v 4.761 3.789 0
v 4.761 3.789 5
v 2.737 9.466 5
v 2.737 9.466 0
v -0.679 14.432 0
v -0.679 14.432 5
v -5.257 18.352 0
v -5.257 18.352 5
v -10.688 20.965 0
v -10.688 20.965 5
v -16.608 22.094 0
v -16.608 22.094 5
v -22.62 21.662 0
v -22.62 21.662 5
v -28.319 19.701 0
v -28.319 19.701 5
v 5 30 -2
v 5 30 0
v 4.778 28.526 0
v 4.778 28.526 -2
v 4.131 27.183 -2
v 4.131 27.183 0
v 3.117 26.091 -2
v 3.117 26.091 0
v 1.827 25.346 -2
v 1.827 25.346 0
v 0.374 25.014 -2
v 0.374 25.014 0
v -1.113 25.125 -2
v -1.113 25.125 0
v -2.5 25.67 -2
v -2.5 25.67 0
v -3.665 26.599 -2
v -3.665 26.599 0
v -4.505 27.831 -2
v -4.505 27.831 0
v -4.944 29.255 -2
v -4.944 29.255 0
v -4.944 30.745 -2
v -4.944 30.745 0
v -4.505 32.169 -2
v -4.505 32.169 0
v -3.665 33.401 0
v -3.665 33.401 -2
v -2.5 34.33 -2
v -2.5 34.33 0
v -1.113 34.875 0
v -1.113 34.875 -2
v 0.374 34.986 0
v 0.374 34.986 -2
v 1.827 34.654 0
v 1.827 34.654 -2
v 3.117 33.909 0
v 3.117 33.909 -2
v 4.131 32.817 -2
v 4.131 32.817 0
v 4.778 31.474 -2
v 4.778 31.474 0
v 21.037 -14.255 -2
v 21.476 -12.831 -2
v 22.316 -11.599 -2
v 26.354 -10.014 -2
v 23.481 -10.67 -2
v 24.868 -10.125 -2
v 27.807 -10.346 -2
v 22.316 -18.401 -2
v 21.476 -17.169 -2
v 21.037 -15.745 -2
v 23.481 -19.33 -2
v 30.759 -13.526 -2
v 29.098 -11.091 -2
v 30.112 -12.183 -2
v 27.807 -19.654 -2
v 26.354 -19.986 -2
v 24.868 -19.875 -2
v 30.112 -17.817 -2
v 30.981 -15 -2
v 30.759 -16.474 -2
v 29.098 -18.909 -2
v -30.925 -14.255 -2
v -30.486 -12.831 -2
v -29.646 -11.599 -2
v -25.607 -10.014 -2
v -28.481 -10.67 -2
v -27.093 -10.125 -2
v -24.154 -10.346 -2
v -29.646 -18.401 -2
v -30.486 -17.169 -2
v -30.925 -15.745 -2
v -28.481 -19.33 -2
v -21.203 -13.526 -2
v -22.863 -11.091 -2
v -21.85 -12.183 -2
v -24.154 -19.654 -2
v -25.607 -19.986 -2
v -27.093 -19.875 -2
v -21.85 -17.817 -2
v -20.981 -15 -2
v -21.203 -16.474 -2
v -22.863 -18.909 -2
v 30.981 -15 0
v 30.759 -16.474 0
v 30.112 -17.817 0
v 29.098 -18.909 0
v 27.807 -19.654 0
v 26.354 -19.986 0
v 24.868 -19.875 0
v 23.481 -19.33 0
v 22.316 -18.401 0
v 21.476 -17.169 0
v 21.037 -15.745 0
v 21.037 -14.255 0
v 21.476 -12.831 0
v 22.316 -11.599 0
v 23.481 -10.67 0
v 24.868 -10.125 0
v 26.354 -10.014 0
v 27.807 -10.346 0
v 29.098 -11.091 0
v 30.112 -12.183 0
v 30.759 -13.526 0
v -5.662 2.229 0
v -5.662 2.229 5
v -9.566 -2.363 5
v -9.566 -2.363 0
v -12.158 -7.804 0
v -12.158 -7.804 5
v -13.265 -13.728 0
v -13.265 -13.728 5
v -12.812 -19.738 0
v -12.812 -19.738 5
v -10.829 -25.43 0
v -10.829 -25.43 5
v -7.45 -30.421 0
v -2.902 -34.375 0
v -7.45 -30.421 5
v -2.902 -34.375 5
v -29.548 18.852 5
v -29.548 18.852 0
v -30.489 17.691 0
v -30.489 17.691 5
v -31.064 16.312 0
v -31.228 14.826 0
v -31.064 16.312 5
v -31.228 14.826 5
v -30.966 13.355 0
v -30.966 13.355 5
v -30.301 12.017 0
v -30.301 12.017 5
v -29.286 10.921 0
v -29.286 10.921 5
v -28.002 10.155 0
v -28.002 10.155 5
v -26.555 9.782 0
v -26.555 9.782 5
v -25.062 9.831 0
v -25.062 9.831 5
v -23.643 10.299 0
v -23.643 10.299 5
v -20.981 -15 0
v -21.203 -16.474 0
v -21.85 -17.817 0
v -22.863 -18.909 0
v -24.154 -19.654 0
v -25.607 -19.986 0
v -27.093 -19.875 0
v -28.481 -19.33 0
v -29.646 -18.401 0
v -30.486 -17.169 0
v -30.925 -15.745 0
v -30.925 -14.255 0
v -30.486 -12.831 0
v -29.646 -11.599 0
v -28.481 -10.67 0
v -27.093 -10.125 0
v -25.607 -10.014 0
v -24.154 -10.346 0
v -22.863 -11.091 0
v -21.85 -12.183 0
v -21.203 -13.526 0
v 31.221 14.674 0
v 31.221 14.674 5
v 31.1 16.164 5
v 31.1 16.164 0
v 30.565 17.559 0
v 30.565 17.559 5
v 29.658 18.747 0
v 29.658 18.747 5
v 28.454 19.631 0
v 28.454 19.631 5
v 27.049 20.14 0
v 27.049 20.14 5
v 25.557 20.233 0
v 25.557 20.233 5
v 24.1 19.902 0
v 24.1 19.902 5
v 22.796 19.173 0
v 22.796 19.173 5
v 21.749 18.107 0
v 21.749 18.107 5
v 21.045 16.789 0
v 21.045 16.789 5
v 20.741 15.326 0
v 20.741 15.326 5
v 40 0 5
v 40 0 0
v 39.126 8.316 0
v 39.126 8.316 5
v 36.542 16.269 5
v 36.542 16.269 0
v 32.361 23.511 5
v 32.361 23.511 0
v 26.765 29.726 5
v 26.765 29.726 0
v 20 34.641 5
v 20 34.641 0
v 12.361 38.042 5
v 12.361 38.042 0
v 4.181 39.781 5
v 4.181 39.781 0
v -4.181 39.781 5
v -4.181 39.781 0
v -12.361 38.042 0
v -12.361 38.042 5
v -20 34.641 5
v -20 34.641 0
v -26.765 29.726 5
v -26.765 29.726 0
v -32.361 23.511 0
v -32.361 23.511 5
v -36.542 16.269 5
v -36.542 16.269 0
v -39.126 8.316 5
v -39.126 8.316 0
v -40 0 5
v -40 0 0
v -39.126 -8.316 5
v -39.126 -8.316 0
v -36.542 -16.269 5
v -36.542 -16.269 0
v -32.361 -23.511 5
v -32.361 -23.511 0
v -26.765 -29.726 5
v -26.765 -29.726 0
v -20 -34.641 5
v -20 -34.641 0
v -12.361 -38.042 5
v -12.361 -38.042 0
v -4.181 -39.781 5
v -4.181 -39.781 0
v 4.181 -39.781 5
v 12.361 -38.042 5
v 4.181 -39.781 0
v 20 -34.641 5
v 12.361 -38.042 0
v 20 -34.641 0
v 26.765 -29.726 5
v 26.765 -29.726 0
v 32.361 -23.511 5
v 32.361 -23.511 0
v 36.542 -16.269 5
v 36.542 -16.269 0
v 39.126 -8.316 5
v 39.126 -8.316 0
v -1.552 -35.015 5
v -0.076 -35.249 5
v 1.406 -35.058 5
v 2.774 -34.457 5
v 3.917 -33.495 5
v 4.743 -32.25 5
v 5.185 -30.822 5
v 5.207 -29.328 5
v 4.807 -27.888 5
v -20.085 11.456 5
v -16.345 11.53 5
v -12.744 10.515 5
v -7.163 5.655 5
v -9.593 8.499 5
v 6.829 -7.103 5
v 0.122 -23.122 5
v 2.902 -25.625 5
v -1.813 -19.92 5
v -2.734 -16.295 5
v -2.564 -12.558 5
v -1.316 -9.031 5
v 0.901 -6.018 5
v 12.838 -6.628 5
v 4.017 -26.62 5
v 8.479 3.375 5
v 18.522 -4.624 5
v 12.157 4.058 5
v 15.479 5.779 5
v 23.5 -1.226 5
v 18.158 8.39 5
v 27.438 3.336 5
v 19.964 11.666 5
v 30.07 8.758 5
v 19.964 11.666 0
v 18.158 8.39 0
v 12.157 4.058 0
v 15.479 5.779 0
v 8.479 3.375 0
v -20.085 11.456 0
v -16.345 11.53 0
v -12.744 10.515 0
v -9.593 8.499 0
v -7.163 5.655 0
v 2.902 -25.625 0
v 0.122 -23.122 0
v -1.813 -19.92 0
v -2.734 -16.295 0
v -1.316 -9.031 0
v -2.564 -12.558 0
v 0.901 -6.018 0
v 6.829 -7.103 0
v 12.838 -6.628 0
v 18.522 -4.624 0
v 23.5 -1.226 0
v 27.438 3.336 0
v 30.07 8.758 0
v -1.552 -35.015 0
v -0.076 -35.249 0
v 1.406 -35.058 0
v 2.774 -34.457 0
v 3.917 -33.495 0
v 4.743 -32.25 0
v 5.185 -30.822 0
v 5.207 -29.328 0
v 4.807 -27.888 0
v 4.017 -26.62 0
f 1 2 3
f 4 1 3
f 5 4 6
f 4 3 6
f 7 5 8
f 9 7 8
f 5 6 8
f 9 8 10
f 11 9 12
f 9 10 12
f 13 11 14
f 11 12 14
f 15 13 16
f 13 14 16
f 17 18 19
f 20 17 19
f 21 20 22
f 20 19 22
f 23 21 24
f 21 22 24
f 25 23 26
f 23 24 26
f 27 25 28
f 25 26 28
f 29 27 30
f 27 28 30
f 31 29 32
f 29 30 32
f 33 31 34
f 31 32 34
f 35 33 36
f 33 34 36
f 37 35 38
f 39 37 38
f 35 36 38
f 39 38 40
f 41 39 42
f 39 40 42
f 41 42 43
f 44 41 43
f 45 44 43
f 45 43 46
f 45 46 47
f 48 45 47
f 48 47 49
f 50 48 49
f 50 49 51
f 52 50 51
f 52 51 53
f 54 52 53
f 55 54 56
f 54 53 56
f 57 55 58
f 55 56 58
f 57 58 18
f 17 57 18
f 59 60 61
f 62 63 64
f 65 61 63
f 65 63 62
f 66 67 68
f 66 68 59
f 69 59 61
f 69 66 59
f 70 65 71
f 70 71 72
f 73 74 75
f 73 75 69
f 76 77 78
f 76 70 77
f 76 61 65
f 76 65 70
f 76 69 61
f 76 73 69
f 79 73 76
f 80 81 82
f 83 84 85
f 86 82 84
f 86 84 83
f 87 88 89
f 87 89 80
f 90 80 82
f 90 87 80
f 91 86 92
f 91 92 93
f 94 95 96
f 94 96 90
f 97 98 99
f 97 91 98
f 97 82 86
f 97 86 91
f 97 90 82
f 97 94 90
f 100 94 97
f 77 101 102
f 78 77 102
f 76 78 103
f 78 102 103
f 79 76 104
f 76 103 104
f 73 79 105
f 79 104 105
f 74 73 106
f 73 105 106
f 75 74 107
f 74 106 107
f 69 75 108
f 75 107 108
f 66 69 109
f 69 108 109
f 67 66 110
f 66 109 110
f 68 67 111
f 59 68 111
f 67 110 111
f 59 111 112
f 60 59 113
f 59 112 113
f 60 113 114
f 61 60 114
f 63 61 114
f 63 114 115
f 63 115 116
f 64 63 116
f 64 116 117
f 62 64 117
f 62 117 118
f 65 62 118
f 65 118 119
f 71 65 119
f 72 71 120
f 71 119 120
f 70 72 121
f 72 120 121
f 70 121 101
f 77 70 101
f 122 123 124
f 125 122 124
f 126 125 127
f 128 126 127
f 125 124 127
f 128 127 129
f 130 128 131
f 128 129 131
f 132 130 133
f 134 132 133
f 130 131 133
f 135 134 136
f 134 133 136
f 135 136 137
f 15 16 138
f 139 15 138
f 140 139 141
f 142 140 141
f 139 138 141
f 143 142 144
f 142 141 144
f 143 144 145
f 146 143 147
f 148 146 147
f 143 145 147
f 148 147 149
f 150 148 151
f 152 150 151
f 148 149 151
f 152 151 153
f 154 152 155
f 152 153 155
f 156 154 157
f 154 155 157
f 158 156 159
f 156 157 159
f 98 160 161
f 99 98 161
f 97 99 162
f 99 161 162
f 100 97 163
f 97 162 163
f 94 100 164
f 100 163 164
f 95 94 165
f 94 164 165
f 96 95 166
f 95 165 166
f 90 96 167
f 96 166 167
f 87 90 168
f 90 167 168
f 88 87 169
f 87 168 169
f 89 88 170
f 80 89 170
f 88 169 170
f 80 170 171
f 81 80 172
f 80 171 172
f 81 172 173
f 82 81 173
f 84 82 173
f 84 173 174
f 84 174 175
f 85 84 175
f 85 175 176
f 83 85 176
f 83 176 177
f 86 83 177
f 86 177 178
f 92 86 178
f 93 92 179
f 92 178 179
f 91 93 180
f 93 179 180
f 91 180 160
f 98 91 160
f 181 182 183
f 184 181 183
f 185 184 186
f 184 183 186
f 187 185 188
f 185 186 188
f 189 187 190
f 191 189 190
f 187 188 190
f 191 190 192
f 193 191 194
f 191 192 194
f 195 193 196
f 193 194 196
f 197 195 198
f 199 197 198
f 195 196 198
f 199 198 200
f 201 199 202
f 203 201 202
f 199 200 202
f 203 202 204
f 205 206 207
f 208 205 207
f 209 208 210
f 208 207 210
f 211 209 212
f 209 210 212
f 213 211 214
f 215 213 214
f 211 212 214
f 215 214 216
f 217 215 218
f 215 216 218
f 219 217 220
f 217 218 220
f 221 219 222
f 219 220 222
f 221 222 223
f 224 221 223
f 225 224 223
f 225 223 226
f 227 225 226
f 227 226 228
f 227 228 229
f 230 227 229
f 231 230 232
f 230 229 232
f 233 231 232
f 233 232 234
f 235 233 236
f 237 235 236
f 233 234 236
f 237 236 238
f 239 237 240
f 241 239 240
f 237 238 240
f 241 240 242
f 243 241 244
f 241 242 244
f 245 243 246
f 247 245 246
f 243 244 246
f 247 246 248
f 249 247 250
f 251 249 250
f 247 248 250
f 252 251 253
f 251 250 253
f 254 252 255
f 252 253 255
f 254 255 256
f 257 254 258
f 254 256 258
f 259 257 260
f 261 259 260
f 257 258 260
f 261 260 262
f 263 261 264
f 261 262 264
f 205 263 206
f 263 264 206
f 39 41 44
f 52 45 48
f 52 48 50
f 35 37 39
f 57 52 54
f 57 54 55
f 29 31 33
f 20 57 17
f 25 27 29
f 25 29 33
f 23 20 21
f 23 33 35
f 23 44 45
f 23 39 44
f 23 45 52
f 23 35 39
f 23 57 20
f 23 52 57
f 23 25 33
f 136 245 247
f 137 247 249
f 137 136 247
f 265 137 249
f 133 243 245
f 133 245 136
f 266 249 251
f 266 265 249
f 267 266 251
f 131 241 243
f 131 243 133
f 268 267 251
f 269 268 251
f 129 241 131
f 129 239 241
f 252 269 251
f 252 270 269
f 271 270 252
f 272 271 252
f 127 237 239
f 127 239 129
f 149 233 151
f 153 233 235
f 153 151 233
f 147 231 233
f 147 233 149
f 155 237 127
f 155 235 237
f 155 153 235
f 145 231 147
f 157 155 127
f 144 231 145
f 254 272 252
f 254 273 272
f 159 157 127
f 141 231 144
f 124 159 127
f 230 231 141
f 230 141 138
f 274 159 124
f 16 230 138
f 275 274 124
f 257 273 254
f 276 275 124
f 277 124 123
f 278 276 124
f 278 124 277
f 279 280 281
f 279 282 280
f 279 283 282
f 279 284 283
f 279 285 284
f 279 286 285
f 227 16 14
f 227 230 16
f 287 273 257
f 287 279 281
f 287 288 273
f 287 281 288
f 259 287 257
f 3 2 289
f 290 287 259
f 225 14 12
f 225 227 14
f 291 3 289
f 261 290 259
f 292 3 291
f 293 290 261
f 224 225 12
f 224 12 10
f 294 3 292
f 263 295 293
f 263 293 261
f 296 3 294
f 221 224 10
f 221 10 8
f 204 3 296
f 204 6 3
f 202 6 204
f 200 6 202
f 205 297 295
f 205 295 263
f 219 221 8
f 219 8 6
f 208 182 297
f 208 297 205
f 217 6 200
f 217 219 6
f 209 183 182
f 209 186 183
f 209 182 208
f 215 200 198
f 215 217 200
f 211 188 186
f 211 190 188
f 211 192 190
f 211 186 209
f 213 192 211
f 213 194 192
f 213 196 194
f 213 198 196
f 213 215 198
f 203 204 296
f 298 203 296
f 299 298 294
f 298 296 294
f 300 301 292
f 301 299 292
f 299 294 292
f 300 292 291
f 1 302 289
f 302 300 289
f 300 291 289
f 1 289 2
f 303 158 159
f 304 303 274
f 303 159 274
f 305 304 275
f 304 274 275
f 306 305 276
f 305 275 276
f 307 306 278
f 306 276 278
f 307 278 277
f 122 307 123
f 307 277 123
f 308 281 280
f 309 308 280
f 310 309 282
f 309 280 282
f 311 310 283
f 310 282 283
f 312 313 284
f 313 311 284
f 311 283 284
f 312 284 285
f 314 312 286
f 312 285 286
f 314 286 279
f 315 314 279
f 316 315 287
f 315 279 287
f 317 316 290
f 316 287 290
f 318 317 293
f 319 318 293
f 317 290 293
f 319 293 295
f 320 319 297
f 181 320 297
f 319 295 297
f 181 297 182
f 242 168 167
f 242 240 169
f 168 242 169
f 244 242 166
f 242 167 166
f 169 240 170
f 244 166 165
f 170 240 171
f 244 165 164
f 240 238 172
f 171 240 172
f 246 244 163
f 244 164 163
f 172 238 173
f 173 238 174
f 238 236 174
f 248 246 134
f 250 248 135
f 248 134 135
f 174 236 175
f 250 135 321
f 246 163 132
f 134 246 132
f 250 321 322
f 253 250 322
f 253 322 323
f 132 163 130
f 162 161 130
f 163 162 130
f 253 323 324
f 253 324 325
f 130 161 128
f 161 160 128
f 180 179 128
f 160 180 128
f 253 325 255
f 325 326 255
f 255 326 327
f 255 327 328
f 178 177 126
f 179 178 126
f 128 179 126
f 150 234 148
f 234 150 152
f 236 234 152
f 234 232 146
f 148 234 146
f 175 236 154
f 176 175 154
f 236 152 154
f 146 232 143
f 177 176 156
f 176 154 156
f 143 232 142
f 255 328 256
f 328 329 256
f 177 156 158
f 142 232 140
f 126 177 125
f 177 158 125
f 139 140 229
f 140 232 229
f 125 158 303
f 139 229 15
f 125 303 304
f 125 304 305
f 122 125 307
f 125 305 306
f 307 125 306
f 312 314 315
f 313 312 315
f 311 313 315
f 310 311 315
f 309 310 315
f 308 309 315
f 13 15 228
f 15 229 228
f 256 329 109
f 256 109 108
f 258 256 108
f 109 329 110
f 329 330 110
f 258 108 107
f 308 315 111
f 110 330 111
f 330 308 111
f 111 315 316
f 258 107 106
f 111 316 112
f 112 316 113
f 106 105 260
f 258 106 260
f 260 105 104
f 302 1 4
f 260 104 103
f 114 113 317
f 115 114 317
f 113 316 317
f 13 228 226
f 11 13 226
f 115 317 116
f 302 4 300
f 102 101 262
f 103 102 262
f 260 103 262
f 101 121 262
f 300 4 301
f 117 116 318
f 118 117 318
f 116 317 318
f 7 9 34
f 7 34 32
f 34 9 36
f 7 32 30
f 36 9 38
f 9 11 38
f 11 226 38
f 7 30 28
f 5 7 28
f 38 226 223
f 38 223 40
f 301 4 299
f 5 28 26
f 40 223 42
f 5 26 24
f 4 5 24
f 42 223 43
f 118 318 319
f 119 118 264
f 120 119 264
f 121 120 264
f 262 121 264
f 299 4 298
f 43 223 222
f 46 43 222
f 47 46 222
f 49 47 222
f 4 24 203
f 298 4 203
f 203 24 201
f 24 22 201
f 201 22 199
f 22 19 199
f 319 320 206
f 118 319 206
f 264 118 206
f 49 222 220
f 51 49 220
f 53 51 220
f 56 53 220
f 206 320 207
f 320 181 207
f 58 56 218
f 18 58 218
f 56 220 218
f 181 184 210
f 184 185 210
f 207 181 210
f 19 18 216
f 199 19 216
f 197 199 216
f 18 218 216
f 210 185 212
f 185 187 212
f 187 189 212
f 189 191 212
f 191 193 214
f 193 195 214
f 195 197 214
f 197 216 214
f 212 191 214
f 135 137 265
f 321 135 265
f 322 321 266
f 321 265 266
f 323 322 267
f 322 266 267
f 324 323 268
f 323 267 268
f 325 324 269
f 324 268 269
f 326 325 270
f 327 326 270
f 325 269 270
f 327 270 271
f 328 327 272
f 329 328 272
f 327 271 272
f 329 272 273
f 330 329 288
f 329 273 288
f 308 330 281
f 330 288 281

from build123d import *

# Parameters (mm, degrees)
CROQUIS1_R              = 40
DISCO_DEPTH             = 5
CORTAR_EXTRUIR1_DEPTH   = 10
CROQUIS7_R              = 5
SALIENTE_EXTRUIR2_DEPTH = 2


with BuildPart() as part:
    # Croquis1 → Disco (new body)
    with BuildSketch(Plane.XY):
        Circle(CROQUIS1_R)
    extrude(amount=DISCO_DEPTH)

    # Croquis6 → Cortar-Extruir1 (cut)
    with BuildSketch(Plane.XY.offset(5)):
        with BuildLine():
            ThreePointArc((20.740877626, 15.325746158), (15.478626449, 5.779368175), (4.761182136, 3.789140187))
            ThreePointArc((4.761182136, 3.789140187), (-7.887176724, 19.835329272), (-28.318599909, 19.700746158))
            ThreePointArc((-28.318599909, 19.700746158), (-30.681508271, 12.662162204), (-23.642924318, 10.299253842))
            ThreePointArc((-23.642924318, 10.299253842), (-12.744392882, 10.515199633), (-5.662082728, 2.228734589))
            ThreePointArc((-5.662082728, 2.228734589), (-13.23431068, -16.748160043), (-2.902046692, -34.375))
            ThreePointArc((-2.902046692, -34.375), (4.375, -32.902046692), (2.902046692, -25.625))
            ThreePointArc((2.902046692, -25.625), (-2.734233567, -16.294567808), (0.900900592, -6.017874775))
            ThreePointArc((0.900900592, -6.017874775), (21.121487404, -3.087169229), (31.220646601, 14.674253842))
            ThreePointArc((31.220646601, 14.674253842), (26.306508271, 20.239884487), (20.740877626, 15.325746158))
        make_face()
    extrude(amount=-CORTAR_EXTRUIR1_DEPTH, mode=Mode.SUBTRACT)

    # Croquis7 → Saliente-Extruir2 (add)
    with BuildSketch(Plane(origin=(0, 0, 0), x_dir=(-1, 0, 0), z_dir=(0, 0, -1))):
        with Locations(Location((0, 30, 0), (0, 0, 180))):
            Circle(CROQUIS7_R)
        with Locations(Location((25.980762114, -15, 0), (0, 0, 180))):
            Circle(CROQUIS7_R)
        with Locations(Location((-25.980762114, -15, 0), (0, 0, 180))):
            Circle(CROQUIS7_R)
    extrude(amount=SALIENTE_EXTRUIR2_DEPTH)


solid = part.part
